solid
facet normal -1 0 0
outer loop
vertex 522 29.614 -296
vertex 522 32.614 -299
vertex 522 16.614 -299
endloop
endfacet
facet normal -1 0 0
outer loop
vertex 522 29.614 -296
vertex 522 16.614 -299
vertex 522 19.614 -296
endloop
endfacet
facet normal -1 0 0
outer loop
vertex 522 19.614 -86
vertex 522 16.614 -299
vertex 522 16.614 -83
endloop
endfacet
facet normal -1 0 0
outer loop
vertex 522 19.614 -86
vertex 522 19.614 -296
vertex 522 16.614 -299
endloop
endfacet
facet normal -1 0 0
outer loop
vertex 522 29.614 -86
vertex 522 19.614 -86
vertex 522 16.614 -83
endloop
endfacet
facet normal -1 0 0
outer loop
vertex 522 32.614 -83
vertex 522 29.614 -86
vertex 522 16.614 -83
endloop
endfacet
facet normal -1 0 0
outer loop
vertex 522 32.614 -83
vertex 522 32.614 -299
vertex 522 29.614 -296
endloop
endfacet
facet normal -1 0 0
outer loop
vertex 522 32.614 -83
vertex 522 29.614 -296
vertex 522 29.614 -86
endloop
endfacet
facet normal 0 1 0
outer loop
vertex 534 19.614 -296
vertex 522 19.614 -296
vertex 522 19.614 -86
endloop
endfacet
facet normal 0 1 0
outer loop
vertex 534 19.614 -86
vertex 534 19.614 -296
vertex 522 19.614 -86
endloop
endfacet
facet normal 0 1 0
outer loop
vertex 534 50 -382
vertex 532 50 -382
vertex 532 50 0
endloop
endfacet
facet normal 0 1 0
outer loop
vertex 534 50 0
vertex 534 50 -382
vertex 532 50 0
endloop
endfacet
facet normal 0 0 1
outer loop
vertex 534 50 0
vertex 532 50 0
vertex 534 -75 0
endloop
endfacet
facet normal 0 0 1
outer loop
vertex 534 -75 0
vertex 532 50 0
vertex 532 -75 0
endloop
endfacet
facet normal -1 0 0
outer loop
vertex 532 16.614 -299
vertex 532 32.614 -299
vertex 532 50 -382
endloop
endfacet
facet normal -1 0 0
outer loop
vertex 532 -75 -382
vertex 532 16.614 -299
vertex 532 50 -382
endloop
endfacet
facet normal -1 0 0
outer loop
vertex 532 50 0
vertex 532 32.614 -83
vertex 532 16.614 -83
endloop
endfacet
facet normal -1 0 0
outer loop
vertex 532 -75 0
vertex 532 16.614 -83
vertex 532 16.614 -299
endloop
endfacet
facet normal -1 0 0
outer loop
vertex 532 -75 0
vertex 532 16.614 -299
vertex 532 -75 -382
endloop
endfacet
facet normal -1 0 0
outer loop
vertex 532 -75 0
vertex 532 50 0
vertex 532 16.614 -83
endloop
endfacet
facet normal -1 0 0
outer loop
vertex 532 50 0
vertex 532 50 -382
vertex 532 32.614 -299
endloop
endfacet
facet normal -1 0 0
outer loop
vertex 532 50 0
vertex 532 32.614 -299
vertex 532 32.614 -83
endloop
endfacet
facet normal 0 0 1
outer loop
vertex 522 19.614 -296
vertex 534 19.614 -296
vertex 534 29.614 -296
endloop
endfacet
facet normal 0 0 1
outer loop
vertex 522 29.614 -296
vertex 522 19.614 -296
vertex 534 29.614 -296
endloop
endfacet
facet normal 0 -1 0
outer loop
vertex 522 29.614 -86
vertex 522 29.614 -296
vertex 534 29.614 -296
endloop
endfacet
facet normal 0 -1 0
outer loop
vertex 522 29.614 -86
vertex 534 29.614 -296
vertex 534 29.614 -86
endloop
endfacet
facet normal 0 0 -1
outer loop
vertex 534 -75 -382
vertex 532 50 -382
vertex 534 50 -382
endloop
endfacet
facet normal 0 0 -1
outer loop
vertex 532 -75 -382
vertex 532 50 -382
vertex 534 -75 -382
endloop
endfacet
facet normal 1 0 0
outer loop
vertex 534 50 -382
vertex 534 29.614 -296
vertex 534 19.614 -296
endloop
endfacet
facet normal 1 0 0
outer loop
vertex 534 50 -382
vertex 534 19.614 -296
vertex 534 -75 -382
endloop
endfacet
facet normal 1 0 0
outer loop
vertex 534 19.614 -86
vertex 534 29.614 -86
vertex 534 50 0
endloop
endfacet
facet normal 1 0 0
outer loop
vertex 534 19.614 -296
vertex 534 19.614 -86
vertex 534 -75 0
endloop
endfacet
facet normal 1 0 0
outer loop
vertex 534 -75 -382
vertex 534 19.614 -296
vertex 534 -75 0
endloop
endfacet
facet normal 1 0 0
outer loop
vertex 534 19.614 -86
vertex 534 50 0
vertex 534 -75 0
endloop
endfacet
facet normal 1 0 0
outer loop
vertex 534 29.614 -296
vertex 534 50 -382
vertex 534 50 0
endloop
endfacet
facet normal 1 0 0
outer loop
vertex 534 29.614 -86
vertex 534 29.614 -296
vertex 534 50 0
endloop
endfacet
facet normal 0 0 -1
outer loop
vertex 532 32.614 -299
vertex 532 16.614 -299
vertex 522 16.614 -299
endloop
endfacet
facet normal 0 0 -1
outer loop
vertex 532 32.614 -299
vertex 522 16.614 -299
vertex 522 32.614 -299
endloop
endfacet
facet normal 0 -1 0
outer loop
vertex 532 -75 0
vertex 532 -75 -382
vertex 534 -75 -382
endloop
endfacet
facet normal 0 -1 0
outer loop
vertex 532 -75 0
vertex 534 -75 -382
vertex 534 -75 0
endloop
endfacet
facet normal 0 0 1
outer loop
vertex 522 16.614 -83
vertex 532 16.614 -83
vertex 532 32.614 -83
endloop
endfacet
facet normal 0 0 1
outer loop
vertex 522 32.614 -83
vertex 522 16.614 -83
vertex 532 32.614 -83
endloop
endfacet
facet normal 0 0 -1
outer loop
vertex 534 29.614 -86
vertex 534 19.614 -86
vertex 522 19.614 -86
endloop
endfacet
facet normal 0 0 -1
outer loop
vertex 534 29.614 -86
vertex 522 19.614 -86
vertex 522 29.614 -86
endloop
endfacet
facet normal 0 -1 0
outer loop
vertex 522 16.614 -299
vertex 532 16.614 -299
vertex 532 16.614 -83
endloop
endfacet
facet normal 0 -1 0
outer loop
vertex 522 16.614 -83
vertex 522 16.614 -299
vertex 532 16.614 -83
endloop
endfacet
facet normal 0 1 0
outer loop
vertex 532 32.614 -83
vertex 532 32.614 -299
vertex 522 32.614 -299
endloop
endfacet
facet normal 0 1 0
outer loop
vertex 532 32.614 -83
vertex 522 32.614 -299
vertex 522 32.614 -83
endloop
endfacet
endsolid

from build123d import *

# Parameters (mm, degrees)
SKETCH1_W           = 125
SKETCH1_H           = 382
BOSS_EXTRUDE1_DEPTH = 2
SKETCH2_W           = 216
SKETCH2_H           = 16
BOSS_EXTRUDE2_DEPTH = 10
SKETCH3_W           = 210
SKETCH3_H           = 10
CUT_EXTRUDE1_DEPTH  = 390.477855596


with BuildPart() as part:
    # Sketch1 → Boss-Extrude1 (new body)
    with BuildSketch(Plane(origin=(532, 0, 0), x_dir=(0, -1, 0), z_dir=(-1, 0, 0))):
        with Locations((12.5, -191)):
            Rectangle(SKETCH1_W, SKETCH1_H)
    extrude(amount=-BOSS_EXTRUDE1_DEPTH)

    # Sketch2 → Boss-Extrude2 (add)
    with BuildSketch(Plane.ZY.offset(-532)):
        with Locations((-191, 24.613657059)):
            Rectangle(SKETCH2_W, SKETCH2_H)
    extrude(amount=BOSS_EXTRUDE2_DEPTH)

    # Sketch3 → Cut-Extrude1 (cut, through all)
    with BuildSketch(Plane.ZY.offset(-522)):
        with Locations((-191, 24.613657059)):
            Rectangle(SKETCH3_W, SKETCH3_H)
    extrude(amount=-CUT_EXTRUDE1_DEPTH, mode=Mode.SUBTRACT)


solid = part.part
